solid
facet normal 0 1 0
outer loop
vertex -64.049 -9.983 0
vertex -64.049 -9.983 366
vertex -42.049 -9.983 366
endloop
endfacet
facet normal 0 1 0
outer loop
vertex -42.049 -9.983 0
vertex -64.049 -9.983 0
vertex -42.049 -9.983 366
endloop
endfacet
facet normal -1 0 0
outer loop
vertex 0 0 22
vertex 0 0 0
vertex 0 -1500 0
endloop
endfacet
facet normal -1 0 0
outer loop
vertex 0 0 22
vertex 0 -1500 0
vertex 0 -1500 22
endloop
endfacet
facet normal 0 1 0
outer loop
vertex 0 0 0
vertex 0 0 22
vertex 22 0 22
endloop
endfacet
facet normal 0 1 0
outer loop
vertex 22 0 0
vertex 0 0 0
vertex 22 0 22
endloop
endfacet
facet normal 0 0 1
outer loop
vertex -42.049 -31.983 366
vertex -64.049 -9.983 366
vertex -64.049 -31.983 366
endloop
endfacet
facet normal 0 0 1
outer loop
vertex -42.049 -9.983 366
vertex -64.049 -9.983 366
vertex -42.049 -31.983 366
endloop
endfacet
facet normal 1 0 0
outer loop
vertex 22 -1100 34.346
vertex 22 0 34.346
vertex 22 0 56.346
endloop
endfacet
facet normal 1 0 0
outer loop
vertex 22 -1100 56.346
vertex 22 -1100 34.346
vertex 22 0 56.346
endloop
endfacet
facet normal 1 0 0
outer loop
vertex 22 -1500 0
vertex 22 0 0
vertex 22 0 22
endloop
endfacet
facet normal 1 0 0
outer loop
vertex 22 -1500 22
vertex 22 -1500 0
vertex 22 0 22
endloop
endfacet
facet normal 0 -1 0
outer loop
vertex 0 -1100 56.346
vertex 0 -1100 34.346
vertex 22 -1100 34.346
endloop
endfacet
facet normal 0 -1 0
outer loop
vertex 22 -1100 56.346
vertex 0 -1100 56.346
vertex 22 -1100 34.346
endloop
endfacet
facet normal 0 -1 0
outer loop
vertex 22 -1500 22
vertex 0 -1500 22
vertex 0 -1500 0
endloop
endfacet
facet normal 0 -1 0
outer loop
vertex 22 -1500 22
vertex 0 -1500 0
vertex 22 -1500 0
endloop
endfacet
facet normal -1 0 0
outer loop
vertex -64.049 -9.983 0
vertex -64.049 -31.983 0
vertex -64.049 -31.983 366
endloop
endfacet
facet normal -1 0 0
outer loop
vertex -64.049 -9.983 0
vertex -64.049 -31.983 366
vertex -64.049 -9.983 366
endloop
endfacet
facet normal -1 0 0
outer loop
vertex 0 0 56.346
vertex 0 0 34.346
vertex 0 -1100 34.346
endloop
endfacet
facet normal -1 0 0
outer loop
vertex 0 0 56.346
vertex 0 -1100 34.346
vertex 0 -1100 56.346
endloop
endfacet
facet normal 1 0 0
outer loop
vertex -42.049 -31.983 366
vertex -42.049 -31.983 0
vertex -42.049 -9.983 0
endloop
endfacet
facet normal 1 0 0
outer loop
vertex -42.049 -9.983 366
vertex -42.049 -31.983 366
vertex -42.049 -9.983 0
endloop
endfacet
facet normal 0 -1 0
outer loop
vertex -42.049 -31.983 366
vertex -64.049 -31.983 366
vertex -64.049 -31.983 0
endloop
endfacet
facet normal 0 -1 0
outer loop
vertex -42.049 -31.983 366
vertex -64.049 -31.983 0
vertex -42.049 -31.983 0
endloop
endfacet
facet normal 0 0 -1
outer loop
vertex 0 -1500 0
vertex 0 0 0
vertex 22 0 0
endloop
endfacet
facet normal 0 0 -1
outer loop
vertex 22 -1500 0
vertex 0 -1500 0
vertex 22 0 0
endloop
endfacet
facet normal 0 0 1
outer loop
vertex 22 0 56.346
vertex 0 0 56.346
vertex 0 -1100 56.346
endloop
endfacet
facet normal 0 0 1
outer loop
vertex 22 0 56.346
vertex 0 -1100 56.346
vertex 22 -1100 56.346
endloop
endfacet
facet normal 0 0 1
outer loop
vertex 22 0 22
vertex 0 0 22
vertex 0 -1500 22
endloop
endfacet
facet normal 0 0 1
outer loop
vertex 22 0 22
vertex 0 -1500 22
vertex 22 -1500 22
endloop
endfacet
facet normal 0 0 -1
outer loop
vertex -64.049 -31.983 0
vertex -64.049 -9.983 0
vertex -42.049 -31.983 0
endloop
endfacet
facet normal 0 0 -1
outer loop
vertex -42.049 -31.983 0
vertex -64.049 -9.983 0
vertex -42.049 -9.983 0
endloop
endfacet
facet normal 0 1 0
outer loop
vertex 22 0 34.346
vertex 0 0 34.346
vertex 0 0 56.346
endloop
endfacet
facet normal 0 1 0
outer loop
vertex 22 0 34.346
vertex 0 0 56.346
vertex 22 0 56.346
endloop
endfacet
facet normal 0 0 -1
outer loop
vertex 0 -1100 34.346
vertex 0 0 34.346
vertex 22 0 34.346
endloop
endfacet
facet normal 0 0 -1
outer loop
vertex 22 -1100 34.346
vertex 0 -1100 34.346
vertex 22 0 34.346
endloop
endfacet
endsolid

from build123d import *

# Parameters (mm, degrees)
F3_W     = 22
F3_H     = 22
F4_DEPTH = 1500
F5_W     = 22
F5_H     = 22
F6_DEPTH = 366
F7_W     = 22
F7_H     = 22
F8_DEPTH = 1100


with BuildPart() as f4:
    # F3 (on Front) → F4 (new body)
    with BuildSketch(Plane.XZ):
        with Locations((11, 11)):
            Rectangle(F3_W, F3_H)
    extrude(amount=F4_DEPTH)


with BuildPart() as f6:
    # F5 (on Top) → F6 (new body)
    with BuildSketch(Plane.XY):
        with Locations((-53.0493322164, -20.9828059624)):
            Rectangle(F5_W, F5_H)
    extrude(amount=F6_DEPTH)


with BuildPart() as f8:
    # F7 (on Front) → F8 (new body)
    with BuildSketch(Plane.XZ):
        with Locations((11, 45.3460401942)):
            Rectangle(F7_W, F7_H)
    extrude(amount=F8_DEPTH)


solid = Compound([f4.part, f6.part, f8.part])
